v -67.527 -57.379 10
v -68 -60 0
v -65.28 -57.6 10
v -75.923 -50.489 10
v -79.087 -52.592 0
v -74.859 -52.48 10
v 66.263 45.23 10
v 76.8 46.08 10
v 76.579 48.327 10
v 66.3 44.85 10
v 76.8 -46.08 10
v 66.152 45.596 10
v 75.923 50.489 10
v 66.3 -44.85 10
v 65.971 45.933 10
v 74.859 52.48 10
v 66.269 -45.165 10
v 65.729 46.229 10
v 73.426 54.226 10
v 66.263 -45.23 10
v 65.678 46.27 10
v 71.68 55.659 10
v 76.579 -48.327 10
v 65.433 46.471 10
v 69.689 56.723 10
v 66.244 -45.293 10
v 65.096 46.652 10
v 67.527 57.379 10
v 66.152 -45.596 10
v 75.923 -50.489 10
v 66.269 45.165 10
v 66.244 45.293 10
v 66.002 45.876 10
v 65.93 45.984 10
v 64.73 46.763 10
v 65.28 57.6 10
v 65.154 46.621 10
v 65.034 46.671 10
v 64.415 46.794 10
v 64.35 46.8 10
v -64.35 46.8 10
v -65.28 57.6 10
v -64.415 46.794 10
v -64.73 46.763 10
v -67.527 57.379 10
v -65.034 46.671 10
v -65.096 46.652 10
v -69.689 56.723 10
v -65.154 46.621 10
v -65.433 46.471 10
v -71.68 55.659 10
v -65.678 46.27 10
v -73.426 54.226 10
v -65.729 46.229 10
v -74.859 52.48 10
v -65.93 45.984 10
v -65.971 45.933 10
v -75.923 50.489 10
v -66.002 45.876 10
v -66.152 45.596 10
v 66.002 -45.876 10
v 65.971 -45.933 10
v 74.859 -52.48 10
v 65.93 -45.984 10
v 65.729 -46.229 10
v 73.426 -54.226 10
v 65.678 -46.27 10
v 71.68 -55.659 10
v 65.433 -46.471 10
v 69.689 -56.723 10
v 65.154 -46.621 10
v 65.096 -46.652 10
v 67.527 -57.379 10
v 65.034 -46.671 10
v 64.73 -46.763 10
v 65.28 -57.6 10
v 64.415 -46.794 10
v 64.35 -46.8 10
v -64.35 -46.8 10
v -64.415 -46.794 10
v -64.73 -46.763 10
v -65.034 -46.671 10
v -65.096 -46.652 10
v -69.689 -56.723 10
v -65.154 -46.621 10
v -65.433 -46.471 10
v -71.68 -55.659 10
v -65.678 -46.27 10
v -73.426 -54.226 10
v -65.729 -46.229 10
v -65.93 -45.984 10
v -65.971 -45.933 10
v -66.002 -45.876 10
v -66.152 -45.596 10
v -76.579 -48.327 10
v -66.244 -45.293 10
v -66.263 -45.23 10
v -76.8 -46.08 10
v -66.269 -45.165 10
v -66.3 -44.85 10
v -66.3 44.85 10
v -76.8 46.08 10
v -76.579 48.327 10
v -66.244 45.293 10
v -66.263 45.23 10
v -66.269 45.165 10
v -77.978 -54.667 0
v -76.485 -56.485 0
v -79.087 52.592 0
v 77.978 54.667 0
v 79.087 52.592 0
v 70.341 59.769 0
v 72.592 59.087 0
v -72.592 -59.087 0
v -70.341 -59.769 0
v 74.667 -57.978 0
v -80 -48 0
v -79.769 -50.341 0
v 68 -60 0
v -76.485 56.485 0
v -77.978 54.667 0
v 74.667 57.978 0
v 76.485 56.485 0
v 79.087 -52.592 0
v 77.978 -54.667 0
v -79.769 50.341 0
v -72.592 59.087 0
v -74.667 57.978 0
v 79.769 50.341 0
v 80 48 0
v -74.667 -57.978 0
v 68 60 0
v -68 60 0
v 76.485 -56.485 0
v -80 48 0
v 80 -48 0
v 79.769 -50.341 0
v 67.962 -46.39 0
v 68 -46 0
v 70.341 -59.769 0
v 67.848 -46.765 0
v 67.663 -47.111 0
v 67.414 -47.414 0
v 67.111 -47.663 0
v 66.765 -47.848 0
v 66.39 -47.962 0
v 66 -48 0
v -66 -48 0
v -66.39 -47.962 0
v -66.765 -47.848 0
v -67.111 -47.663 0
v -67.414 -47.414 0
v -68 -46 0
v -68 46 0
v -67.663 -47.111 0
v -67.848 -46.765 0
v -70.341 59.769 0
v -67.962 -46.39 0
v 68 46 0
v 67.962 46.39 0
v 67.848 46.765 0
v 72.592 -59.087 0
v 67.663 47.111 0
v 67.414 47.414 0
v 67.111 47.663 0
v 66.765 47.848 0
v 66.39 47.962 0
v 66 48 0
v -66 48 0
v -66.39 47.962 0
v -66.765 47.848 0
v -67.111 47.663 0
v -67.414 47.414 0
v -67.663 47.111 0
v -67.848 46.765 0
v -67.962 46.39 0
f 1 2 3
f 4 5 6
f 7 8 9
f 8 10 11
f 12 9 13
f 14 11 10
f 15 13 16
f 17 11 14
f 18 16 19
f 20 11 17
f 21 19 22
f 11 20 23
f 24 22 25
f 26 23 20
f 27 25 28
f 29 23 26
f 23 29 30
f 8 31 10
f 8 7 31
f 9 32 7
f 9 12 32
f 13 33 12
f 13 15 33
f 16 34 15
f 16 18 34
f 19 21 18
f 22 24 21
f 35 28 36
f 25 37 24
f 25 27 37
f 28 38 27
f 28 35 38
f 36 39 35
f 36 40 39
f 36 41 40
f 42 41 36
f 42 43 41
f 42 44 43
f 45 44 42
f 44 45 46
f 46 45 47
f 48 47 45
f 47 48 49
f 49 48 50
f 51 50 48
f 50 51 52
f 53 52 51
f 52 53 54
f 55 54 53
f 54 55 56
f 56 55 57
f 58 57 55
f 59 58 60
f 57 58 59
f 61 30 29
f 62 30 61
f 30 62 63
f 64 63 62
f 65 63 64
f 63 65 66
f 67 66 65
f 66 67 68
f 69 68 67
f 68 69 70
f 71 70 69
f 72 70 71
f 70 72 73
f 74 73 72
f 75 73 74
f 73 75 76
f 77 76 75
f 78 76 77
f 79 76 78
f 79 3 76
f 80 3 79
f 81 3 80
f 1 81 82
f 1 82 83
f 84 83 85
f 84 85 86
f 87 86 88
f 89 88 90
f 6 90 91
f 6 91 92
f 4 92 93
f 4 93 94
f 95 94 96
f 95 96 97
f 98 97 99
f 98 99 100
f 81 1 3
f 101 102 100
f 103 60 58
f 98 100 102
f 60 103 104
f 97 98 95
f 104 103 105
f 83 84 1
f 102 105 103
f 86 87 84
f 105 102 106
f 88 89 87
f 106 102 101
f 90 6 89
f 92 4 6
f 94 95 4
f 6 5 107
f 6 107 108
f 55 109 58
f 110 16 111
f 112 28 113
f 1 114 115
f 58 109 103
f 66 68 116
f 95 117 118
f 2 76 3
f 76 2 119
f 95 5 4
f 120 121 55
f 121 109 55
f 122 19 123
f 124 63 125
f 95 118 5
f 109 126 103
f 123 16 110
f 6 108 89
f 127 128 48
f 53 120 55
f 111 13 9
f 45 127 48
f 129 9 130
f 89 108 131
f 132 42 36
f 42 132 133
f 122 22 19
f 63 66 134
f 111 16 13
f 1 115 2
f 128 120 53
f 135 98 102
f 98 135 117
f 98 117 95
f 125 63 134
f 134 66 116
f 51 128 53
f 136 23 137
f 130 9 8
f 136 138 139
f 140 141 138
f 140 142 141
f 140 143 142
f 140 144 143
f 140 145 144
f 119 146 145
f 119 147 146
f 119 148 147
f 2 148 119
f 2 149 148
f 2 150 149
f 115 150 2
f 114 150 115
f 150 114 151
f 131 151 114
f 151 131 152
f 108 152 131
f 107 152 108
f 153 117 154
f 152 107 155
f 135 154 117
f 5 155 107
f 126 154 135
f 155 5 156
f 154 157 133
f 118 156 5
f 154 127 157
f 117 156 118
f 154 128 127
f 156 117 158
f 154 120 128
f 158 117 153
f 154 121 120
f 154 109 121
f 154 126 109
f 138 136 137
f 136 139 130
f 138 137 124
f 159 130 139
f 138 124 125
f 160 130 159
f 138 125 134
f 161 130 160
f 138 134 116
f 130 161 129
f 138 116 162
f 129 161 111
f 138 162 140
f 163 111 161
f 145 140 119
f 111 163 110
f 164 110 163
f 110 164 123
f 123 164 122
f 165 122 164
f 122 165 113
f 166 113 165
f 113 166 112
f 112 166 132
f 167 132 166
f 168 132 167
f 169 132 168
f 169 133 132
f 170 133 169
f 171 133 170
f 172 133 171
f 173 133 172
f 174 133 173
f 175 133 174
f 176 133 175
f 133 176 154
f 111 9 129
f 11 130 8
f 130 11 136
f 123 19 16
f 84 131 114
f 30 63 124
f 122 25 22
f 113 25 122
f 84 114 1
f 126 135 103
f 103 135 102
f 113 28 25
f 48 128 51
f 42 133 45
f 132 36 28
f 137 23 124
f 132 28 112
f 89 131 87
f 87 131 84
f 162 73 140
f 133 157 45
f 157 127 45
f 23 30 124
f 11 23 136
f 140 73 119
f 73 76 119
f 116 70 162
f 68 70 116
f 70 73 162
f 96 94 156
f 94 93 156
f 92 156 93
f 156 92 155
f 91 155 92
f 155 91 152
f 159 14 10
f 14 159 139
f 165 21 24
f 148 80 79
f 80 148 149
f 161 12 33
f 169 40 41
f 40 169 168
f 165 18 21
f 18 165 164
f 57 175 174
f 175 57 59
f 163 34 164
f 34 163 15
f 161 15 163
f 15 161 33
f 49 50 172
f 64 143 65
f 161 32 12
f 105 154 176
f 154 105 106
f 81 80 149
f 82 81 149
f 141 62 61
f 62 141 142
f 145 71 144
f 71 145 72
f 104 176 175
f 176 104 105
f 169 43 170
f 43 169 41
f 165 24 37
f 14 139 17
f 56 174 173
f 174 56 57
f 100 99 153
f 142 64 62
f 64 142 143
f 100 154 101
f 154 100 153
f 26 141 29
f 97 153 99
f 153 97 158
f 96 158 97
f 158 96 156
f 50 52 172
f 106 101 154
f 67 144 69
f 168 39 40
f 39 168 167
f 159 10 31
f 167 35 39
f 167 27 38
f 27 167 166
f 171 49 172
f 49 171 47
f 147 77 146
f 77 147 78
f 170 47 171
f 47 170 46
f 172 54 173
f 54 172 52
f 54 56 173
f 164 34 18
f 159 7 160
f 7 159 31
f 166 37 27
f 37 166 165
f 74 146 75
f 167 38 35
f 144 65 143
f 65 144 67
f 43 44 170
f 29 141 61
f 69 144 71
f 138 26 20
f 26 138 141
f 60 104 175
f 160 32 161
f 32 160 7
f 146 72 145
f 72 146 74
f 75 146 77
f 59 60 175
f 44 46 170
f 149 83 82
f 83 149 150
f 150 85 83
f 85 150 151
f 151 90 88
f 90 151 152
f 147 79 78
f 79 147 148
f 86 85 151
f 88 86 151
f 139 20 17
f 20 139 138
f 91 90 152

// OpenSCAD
$fn = 32;

// ----------------------------------------------------------------------
// Display bezel: 160 x 120 mm frame, opening 136x96 mm
// ----------------------------------------------------------------------

// --- parameters (mm) ---
length = 160;             // frame outside length, X
width = 120;              // frame outside width, Y
frame_w = 12;             // frame width
thickness = 10;           // frame thickness
corner_r = 12;            // outside corner radius
chamfer = 0.96;           // outer wall taper
funnel = 0.97;            // inner opening taper
opening_l = 136;          // opening length
opening_w = 96;           // opening width
inner_r = 2;              // opening corner radius

/* rounded-rectangle outlines, generated with loops */
module rounded_ring(l_nom, w_nom, r) {
  hull() {
    for (sx = [-1, 1]) for (sy = [-1, 1])
      translate([sx * (l_nom / 2 - r), sy * (w_nom / 2 - r)]) circle(r = r);
  }
}

difference() {
  /* frame body, drafted so the outer edge is a variable-depth chamfer */
  linear_extrude(height = thickness, scale = chamfer)
    rounded_ring(length, width, corner_r);
  /* viewing opening, drafted the other way for a funnel edge */
  linear_extrude(height = thickness + 2, scale = funnel)
    translate([0, 0, -1]) rounded_ring(opening_l, opening_w, inner_r);
}
